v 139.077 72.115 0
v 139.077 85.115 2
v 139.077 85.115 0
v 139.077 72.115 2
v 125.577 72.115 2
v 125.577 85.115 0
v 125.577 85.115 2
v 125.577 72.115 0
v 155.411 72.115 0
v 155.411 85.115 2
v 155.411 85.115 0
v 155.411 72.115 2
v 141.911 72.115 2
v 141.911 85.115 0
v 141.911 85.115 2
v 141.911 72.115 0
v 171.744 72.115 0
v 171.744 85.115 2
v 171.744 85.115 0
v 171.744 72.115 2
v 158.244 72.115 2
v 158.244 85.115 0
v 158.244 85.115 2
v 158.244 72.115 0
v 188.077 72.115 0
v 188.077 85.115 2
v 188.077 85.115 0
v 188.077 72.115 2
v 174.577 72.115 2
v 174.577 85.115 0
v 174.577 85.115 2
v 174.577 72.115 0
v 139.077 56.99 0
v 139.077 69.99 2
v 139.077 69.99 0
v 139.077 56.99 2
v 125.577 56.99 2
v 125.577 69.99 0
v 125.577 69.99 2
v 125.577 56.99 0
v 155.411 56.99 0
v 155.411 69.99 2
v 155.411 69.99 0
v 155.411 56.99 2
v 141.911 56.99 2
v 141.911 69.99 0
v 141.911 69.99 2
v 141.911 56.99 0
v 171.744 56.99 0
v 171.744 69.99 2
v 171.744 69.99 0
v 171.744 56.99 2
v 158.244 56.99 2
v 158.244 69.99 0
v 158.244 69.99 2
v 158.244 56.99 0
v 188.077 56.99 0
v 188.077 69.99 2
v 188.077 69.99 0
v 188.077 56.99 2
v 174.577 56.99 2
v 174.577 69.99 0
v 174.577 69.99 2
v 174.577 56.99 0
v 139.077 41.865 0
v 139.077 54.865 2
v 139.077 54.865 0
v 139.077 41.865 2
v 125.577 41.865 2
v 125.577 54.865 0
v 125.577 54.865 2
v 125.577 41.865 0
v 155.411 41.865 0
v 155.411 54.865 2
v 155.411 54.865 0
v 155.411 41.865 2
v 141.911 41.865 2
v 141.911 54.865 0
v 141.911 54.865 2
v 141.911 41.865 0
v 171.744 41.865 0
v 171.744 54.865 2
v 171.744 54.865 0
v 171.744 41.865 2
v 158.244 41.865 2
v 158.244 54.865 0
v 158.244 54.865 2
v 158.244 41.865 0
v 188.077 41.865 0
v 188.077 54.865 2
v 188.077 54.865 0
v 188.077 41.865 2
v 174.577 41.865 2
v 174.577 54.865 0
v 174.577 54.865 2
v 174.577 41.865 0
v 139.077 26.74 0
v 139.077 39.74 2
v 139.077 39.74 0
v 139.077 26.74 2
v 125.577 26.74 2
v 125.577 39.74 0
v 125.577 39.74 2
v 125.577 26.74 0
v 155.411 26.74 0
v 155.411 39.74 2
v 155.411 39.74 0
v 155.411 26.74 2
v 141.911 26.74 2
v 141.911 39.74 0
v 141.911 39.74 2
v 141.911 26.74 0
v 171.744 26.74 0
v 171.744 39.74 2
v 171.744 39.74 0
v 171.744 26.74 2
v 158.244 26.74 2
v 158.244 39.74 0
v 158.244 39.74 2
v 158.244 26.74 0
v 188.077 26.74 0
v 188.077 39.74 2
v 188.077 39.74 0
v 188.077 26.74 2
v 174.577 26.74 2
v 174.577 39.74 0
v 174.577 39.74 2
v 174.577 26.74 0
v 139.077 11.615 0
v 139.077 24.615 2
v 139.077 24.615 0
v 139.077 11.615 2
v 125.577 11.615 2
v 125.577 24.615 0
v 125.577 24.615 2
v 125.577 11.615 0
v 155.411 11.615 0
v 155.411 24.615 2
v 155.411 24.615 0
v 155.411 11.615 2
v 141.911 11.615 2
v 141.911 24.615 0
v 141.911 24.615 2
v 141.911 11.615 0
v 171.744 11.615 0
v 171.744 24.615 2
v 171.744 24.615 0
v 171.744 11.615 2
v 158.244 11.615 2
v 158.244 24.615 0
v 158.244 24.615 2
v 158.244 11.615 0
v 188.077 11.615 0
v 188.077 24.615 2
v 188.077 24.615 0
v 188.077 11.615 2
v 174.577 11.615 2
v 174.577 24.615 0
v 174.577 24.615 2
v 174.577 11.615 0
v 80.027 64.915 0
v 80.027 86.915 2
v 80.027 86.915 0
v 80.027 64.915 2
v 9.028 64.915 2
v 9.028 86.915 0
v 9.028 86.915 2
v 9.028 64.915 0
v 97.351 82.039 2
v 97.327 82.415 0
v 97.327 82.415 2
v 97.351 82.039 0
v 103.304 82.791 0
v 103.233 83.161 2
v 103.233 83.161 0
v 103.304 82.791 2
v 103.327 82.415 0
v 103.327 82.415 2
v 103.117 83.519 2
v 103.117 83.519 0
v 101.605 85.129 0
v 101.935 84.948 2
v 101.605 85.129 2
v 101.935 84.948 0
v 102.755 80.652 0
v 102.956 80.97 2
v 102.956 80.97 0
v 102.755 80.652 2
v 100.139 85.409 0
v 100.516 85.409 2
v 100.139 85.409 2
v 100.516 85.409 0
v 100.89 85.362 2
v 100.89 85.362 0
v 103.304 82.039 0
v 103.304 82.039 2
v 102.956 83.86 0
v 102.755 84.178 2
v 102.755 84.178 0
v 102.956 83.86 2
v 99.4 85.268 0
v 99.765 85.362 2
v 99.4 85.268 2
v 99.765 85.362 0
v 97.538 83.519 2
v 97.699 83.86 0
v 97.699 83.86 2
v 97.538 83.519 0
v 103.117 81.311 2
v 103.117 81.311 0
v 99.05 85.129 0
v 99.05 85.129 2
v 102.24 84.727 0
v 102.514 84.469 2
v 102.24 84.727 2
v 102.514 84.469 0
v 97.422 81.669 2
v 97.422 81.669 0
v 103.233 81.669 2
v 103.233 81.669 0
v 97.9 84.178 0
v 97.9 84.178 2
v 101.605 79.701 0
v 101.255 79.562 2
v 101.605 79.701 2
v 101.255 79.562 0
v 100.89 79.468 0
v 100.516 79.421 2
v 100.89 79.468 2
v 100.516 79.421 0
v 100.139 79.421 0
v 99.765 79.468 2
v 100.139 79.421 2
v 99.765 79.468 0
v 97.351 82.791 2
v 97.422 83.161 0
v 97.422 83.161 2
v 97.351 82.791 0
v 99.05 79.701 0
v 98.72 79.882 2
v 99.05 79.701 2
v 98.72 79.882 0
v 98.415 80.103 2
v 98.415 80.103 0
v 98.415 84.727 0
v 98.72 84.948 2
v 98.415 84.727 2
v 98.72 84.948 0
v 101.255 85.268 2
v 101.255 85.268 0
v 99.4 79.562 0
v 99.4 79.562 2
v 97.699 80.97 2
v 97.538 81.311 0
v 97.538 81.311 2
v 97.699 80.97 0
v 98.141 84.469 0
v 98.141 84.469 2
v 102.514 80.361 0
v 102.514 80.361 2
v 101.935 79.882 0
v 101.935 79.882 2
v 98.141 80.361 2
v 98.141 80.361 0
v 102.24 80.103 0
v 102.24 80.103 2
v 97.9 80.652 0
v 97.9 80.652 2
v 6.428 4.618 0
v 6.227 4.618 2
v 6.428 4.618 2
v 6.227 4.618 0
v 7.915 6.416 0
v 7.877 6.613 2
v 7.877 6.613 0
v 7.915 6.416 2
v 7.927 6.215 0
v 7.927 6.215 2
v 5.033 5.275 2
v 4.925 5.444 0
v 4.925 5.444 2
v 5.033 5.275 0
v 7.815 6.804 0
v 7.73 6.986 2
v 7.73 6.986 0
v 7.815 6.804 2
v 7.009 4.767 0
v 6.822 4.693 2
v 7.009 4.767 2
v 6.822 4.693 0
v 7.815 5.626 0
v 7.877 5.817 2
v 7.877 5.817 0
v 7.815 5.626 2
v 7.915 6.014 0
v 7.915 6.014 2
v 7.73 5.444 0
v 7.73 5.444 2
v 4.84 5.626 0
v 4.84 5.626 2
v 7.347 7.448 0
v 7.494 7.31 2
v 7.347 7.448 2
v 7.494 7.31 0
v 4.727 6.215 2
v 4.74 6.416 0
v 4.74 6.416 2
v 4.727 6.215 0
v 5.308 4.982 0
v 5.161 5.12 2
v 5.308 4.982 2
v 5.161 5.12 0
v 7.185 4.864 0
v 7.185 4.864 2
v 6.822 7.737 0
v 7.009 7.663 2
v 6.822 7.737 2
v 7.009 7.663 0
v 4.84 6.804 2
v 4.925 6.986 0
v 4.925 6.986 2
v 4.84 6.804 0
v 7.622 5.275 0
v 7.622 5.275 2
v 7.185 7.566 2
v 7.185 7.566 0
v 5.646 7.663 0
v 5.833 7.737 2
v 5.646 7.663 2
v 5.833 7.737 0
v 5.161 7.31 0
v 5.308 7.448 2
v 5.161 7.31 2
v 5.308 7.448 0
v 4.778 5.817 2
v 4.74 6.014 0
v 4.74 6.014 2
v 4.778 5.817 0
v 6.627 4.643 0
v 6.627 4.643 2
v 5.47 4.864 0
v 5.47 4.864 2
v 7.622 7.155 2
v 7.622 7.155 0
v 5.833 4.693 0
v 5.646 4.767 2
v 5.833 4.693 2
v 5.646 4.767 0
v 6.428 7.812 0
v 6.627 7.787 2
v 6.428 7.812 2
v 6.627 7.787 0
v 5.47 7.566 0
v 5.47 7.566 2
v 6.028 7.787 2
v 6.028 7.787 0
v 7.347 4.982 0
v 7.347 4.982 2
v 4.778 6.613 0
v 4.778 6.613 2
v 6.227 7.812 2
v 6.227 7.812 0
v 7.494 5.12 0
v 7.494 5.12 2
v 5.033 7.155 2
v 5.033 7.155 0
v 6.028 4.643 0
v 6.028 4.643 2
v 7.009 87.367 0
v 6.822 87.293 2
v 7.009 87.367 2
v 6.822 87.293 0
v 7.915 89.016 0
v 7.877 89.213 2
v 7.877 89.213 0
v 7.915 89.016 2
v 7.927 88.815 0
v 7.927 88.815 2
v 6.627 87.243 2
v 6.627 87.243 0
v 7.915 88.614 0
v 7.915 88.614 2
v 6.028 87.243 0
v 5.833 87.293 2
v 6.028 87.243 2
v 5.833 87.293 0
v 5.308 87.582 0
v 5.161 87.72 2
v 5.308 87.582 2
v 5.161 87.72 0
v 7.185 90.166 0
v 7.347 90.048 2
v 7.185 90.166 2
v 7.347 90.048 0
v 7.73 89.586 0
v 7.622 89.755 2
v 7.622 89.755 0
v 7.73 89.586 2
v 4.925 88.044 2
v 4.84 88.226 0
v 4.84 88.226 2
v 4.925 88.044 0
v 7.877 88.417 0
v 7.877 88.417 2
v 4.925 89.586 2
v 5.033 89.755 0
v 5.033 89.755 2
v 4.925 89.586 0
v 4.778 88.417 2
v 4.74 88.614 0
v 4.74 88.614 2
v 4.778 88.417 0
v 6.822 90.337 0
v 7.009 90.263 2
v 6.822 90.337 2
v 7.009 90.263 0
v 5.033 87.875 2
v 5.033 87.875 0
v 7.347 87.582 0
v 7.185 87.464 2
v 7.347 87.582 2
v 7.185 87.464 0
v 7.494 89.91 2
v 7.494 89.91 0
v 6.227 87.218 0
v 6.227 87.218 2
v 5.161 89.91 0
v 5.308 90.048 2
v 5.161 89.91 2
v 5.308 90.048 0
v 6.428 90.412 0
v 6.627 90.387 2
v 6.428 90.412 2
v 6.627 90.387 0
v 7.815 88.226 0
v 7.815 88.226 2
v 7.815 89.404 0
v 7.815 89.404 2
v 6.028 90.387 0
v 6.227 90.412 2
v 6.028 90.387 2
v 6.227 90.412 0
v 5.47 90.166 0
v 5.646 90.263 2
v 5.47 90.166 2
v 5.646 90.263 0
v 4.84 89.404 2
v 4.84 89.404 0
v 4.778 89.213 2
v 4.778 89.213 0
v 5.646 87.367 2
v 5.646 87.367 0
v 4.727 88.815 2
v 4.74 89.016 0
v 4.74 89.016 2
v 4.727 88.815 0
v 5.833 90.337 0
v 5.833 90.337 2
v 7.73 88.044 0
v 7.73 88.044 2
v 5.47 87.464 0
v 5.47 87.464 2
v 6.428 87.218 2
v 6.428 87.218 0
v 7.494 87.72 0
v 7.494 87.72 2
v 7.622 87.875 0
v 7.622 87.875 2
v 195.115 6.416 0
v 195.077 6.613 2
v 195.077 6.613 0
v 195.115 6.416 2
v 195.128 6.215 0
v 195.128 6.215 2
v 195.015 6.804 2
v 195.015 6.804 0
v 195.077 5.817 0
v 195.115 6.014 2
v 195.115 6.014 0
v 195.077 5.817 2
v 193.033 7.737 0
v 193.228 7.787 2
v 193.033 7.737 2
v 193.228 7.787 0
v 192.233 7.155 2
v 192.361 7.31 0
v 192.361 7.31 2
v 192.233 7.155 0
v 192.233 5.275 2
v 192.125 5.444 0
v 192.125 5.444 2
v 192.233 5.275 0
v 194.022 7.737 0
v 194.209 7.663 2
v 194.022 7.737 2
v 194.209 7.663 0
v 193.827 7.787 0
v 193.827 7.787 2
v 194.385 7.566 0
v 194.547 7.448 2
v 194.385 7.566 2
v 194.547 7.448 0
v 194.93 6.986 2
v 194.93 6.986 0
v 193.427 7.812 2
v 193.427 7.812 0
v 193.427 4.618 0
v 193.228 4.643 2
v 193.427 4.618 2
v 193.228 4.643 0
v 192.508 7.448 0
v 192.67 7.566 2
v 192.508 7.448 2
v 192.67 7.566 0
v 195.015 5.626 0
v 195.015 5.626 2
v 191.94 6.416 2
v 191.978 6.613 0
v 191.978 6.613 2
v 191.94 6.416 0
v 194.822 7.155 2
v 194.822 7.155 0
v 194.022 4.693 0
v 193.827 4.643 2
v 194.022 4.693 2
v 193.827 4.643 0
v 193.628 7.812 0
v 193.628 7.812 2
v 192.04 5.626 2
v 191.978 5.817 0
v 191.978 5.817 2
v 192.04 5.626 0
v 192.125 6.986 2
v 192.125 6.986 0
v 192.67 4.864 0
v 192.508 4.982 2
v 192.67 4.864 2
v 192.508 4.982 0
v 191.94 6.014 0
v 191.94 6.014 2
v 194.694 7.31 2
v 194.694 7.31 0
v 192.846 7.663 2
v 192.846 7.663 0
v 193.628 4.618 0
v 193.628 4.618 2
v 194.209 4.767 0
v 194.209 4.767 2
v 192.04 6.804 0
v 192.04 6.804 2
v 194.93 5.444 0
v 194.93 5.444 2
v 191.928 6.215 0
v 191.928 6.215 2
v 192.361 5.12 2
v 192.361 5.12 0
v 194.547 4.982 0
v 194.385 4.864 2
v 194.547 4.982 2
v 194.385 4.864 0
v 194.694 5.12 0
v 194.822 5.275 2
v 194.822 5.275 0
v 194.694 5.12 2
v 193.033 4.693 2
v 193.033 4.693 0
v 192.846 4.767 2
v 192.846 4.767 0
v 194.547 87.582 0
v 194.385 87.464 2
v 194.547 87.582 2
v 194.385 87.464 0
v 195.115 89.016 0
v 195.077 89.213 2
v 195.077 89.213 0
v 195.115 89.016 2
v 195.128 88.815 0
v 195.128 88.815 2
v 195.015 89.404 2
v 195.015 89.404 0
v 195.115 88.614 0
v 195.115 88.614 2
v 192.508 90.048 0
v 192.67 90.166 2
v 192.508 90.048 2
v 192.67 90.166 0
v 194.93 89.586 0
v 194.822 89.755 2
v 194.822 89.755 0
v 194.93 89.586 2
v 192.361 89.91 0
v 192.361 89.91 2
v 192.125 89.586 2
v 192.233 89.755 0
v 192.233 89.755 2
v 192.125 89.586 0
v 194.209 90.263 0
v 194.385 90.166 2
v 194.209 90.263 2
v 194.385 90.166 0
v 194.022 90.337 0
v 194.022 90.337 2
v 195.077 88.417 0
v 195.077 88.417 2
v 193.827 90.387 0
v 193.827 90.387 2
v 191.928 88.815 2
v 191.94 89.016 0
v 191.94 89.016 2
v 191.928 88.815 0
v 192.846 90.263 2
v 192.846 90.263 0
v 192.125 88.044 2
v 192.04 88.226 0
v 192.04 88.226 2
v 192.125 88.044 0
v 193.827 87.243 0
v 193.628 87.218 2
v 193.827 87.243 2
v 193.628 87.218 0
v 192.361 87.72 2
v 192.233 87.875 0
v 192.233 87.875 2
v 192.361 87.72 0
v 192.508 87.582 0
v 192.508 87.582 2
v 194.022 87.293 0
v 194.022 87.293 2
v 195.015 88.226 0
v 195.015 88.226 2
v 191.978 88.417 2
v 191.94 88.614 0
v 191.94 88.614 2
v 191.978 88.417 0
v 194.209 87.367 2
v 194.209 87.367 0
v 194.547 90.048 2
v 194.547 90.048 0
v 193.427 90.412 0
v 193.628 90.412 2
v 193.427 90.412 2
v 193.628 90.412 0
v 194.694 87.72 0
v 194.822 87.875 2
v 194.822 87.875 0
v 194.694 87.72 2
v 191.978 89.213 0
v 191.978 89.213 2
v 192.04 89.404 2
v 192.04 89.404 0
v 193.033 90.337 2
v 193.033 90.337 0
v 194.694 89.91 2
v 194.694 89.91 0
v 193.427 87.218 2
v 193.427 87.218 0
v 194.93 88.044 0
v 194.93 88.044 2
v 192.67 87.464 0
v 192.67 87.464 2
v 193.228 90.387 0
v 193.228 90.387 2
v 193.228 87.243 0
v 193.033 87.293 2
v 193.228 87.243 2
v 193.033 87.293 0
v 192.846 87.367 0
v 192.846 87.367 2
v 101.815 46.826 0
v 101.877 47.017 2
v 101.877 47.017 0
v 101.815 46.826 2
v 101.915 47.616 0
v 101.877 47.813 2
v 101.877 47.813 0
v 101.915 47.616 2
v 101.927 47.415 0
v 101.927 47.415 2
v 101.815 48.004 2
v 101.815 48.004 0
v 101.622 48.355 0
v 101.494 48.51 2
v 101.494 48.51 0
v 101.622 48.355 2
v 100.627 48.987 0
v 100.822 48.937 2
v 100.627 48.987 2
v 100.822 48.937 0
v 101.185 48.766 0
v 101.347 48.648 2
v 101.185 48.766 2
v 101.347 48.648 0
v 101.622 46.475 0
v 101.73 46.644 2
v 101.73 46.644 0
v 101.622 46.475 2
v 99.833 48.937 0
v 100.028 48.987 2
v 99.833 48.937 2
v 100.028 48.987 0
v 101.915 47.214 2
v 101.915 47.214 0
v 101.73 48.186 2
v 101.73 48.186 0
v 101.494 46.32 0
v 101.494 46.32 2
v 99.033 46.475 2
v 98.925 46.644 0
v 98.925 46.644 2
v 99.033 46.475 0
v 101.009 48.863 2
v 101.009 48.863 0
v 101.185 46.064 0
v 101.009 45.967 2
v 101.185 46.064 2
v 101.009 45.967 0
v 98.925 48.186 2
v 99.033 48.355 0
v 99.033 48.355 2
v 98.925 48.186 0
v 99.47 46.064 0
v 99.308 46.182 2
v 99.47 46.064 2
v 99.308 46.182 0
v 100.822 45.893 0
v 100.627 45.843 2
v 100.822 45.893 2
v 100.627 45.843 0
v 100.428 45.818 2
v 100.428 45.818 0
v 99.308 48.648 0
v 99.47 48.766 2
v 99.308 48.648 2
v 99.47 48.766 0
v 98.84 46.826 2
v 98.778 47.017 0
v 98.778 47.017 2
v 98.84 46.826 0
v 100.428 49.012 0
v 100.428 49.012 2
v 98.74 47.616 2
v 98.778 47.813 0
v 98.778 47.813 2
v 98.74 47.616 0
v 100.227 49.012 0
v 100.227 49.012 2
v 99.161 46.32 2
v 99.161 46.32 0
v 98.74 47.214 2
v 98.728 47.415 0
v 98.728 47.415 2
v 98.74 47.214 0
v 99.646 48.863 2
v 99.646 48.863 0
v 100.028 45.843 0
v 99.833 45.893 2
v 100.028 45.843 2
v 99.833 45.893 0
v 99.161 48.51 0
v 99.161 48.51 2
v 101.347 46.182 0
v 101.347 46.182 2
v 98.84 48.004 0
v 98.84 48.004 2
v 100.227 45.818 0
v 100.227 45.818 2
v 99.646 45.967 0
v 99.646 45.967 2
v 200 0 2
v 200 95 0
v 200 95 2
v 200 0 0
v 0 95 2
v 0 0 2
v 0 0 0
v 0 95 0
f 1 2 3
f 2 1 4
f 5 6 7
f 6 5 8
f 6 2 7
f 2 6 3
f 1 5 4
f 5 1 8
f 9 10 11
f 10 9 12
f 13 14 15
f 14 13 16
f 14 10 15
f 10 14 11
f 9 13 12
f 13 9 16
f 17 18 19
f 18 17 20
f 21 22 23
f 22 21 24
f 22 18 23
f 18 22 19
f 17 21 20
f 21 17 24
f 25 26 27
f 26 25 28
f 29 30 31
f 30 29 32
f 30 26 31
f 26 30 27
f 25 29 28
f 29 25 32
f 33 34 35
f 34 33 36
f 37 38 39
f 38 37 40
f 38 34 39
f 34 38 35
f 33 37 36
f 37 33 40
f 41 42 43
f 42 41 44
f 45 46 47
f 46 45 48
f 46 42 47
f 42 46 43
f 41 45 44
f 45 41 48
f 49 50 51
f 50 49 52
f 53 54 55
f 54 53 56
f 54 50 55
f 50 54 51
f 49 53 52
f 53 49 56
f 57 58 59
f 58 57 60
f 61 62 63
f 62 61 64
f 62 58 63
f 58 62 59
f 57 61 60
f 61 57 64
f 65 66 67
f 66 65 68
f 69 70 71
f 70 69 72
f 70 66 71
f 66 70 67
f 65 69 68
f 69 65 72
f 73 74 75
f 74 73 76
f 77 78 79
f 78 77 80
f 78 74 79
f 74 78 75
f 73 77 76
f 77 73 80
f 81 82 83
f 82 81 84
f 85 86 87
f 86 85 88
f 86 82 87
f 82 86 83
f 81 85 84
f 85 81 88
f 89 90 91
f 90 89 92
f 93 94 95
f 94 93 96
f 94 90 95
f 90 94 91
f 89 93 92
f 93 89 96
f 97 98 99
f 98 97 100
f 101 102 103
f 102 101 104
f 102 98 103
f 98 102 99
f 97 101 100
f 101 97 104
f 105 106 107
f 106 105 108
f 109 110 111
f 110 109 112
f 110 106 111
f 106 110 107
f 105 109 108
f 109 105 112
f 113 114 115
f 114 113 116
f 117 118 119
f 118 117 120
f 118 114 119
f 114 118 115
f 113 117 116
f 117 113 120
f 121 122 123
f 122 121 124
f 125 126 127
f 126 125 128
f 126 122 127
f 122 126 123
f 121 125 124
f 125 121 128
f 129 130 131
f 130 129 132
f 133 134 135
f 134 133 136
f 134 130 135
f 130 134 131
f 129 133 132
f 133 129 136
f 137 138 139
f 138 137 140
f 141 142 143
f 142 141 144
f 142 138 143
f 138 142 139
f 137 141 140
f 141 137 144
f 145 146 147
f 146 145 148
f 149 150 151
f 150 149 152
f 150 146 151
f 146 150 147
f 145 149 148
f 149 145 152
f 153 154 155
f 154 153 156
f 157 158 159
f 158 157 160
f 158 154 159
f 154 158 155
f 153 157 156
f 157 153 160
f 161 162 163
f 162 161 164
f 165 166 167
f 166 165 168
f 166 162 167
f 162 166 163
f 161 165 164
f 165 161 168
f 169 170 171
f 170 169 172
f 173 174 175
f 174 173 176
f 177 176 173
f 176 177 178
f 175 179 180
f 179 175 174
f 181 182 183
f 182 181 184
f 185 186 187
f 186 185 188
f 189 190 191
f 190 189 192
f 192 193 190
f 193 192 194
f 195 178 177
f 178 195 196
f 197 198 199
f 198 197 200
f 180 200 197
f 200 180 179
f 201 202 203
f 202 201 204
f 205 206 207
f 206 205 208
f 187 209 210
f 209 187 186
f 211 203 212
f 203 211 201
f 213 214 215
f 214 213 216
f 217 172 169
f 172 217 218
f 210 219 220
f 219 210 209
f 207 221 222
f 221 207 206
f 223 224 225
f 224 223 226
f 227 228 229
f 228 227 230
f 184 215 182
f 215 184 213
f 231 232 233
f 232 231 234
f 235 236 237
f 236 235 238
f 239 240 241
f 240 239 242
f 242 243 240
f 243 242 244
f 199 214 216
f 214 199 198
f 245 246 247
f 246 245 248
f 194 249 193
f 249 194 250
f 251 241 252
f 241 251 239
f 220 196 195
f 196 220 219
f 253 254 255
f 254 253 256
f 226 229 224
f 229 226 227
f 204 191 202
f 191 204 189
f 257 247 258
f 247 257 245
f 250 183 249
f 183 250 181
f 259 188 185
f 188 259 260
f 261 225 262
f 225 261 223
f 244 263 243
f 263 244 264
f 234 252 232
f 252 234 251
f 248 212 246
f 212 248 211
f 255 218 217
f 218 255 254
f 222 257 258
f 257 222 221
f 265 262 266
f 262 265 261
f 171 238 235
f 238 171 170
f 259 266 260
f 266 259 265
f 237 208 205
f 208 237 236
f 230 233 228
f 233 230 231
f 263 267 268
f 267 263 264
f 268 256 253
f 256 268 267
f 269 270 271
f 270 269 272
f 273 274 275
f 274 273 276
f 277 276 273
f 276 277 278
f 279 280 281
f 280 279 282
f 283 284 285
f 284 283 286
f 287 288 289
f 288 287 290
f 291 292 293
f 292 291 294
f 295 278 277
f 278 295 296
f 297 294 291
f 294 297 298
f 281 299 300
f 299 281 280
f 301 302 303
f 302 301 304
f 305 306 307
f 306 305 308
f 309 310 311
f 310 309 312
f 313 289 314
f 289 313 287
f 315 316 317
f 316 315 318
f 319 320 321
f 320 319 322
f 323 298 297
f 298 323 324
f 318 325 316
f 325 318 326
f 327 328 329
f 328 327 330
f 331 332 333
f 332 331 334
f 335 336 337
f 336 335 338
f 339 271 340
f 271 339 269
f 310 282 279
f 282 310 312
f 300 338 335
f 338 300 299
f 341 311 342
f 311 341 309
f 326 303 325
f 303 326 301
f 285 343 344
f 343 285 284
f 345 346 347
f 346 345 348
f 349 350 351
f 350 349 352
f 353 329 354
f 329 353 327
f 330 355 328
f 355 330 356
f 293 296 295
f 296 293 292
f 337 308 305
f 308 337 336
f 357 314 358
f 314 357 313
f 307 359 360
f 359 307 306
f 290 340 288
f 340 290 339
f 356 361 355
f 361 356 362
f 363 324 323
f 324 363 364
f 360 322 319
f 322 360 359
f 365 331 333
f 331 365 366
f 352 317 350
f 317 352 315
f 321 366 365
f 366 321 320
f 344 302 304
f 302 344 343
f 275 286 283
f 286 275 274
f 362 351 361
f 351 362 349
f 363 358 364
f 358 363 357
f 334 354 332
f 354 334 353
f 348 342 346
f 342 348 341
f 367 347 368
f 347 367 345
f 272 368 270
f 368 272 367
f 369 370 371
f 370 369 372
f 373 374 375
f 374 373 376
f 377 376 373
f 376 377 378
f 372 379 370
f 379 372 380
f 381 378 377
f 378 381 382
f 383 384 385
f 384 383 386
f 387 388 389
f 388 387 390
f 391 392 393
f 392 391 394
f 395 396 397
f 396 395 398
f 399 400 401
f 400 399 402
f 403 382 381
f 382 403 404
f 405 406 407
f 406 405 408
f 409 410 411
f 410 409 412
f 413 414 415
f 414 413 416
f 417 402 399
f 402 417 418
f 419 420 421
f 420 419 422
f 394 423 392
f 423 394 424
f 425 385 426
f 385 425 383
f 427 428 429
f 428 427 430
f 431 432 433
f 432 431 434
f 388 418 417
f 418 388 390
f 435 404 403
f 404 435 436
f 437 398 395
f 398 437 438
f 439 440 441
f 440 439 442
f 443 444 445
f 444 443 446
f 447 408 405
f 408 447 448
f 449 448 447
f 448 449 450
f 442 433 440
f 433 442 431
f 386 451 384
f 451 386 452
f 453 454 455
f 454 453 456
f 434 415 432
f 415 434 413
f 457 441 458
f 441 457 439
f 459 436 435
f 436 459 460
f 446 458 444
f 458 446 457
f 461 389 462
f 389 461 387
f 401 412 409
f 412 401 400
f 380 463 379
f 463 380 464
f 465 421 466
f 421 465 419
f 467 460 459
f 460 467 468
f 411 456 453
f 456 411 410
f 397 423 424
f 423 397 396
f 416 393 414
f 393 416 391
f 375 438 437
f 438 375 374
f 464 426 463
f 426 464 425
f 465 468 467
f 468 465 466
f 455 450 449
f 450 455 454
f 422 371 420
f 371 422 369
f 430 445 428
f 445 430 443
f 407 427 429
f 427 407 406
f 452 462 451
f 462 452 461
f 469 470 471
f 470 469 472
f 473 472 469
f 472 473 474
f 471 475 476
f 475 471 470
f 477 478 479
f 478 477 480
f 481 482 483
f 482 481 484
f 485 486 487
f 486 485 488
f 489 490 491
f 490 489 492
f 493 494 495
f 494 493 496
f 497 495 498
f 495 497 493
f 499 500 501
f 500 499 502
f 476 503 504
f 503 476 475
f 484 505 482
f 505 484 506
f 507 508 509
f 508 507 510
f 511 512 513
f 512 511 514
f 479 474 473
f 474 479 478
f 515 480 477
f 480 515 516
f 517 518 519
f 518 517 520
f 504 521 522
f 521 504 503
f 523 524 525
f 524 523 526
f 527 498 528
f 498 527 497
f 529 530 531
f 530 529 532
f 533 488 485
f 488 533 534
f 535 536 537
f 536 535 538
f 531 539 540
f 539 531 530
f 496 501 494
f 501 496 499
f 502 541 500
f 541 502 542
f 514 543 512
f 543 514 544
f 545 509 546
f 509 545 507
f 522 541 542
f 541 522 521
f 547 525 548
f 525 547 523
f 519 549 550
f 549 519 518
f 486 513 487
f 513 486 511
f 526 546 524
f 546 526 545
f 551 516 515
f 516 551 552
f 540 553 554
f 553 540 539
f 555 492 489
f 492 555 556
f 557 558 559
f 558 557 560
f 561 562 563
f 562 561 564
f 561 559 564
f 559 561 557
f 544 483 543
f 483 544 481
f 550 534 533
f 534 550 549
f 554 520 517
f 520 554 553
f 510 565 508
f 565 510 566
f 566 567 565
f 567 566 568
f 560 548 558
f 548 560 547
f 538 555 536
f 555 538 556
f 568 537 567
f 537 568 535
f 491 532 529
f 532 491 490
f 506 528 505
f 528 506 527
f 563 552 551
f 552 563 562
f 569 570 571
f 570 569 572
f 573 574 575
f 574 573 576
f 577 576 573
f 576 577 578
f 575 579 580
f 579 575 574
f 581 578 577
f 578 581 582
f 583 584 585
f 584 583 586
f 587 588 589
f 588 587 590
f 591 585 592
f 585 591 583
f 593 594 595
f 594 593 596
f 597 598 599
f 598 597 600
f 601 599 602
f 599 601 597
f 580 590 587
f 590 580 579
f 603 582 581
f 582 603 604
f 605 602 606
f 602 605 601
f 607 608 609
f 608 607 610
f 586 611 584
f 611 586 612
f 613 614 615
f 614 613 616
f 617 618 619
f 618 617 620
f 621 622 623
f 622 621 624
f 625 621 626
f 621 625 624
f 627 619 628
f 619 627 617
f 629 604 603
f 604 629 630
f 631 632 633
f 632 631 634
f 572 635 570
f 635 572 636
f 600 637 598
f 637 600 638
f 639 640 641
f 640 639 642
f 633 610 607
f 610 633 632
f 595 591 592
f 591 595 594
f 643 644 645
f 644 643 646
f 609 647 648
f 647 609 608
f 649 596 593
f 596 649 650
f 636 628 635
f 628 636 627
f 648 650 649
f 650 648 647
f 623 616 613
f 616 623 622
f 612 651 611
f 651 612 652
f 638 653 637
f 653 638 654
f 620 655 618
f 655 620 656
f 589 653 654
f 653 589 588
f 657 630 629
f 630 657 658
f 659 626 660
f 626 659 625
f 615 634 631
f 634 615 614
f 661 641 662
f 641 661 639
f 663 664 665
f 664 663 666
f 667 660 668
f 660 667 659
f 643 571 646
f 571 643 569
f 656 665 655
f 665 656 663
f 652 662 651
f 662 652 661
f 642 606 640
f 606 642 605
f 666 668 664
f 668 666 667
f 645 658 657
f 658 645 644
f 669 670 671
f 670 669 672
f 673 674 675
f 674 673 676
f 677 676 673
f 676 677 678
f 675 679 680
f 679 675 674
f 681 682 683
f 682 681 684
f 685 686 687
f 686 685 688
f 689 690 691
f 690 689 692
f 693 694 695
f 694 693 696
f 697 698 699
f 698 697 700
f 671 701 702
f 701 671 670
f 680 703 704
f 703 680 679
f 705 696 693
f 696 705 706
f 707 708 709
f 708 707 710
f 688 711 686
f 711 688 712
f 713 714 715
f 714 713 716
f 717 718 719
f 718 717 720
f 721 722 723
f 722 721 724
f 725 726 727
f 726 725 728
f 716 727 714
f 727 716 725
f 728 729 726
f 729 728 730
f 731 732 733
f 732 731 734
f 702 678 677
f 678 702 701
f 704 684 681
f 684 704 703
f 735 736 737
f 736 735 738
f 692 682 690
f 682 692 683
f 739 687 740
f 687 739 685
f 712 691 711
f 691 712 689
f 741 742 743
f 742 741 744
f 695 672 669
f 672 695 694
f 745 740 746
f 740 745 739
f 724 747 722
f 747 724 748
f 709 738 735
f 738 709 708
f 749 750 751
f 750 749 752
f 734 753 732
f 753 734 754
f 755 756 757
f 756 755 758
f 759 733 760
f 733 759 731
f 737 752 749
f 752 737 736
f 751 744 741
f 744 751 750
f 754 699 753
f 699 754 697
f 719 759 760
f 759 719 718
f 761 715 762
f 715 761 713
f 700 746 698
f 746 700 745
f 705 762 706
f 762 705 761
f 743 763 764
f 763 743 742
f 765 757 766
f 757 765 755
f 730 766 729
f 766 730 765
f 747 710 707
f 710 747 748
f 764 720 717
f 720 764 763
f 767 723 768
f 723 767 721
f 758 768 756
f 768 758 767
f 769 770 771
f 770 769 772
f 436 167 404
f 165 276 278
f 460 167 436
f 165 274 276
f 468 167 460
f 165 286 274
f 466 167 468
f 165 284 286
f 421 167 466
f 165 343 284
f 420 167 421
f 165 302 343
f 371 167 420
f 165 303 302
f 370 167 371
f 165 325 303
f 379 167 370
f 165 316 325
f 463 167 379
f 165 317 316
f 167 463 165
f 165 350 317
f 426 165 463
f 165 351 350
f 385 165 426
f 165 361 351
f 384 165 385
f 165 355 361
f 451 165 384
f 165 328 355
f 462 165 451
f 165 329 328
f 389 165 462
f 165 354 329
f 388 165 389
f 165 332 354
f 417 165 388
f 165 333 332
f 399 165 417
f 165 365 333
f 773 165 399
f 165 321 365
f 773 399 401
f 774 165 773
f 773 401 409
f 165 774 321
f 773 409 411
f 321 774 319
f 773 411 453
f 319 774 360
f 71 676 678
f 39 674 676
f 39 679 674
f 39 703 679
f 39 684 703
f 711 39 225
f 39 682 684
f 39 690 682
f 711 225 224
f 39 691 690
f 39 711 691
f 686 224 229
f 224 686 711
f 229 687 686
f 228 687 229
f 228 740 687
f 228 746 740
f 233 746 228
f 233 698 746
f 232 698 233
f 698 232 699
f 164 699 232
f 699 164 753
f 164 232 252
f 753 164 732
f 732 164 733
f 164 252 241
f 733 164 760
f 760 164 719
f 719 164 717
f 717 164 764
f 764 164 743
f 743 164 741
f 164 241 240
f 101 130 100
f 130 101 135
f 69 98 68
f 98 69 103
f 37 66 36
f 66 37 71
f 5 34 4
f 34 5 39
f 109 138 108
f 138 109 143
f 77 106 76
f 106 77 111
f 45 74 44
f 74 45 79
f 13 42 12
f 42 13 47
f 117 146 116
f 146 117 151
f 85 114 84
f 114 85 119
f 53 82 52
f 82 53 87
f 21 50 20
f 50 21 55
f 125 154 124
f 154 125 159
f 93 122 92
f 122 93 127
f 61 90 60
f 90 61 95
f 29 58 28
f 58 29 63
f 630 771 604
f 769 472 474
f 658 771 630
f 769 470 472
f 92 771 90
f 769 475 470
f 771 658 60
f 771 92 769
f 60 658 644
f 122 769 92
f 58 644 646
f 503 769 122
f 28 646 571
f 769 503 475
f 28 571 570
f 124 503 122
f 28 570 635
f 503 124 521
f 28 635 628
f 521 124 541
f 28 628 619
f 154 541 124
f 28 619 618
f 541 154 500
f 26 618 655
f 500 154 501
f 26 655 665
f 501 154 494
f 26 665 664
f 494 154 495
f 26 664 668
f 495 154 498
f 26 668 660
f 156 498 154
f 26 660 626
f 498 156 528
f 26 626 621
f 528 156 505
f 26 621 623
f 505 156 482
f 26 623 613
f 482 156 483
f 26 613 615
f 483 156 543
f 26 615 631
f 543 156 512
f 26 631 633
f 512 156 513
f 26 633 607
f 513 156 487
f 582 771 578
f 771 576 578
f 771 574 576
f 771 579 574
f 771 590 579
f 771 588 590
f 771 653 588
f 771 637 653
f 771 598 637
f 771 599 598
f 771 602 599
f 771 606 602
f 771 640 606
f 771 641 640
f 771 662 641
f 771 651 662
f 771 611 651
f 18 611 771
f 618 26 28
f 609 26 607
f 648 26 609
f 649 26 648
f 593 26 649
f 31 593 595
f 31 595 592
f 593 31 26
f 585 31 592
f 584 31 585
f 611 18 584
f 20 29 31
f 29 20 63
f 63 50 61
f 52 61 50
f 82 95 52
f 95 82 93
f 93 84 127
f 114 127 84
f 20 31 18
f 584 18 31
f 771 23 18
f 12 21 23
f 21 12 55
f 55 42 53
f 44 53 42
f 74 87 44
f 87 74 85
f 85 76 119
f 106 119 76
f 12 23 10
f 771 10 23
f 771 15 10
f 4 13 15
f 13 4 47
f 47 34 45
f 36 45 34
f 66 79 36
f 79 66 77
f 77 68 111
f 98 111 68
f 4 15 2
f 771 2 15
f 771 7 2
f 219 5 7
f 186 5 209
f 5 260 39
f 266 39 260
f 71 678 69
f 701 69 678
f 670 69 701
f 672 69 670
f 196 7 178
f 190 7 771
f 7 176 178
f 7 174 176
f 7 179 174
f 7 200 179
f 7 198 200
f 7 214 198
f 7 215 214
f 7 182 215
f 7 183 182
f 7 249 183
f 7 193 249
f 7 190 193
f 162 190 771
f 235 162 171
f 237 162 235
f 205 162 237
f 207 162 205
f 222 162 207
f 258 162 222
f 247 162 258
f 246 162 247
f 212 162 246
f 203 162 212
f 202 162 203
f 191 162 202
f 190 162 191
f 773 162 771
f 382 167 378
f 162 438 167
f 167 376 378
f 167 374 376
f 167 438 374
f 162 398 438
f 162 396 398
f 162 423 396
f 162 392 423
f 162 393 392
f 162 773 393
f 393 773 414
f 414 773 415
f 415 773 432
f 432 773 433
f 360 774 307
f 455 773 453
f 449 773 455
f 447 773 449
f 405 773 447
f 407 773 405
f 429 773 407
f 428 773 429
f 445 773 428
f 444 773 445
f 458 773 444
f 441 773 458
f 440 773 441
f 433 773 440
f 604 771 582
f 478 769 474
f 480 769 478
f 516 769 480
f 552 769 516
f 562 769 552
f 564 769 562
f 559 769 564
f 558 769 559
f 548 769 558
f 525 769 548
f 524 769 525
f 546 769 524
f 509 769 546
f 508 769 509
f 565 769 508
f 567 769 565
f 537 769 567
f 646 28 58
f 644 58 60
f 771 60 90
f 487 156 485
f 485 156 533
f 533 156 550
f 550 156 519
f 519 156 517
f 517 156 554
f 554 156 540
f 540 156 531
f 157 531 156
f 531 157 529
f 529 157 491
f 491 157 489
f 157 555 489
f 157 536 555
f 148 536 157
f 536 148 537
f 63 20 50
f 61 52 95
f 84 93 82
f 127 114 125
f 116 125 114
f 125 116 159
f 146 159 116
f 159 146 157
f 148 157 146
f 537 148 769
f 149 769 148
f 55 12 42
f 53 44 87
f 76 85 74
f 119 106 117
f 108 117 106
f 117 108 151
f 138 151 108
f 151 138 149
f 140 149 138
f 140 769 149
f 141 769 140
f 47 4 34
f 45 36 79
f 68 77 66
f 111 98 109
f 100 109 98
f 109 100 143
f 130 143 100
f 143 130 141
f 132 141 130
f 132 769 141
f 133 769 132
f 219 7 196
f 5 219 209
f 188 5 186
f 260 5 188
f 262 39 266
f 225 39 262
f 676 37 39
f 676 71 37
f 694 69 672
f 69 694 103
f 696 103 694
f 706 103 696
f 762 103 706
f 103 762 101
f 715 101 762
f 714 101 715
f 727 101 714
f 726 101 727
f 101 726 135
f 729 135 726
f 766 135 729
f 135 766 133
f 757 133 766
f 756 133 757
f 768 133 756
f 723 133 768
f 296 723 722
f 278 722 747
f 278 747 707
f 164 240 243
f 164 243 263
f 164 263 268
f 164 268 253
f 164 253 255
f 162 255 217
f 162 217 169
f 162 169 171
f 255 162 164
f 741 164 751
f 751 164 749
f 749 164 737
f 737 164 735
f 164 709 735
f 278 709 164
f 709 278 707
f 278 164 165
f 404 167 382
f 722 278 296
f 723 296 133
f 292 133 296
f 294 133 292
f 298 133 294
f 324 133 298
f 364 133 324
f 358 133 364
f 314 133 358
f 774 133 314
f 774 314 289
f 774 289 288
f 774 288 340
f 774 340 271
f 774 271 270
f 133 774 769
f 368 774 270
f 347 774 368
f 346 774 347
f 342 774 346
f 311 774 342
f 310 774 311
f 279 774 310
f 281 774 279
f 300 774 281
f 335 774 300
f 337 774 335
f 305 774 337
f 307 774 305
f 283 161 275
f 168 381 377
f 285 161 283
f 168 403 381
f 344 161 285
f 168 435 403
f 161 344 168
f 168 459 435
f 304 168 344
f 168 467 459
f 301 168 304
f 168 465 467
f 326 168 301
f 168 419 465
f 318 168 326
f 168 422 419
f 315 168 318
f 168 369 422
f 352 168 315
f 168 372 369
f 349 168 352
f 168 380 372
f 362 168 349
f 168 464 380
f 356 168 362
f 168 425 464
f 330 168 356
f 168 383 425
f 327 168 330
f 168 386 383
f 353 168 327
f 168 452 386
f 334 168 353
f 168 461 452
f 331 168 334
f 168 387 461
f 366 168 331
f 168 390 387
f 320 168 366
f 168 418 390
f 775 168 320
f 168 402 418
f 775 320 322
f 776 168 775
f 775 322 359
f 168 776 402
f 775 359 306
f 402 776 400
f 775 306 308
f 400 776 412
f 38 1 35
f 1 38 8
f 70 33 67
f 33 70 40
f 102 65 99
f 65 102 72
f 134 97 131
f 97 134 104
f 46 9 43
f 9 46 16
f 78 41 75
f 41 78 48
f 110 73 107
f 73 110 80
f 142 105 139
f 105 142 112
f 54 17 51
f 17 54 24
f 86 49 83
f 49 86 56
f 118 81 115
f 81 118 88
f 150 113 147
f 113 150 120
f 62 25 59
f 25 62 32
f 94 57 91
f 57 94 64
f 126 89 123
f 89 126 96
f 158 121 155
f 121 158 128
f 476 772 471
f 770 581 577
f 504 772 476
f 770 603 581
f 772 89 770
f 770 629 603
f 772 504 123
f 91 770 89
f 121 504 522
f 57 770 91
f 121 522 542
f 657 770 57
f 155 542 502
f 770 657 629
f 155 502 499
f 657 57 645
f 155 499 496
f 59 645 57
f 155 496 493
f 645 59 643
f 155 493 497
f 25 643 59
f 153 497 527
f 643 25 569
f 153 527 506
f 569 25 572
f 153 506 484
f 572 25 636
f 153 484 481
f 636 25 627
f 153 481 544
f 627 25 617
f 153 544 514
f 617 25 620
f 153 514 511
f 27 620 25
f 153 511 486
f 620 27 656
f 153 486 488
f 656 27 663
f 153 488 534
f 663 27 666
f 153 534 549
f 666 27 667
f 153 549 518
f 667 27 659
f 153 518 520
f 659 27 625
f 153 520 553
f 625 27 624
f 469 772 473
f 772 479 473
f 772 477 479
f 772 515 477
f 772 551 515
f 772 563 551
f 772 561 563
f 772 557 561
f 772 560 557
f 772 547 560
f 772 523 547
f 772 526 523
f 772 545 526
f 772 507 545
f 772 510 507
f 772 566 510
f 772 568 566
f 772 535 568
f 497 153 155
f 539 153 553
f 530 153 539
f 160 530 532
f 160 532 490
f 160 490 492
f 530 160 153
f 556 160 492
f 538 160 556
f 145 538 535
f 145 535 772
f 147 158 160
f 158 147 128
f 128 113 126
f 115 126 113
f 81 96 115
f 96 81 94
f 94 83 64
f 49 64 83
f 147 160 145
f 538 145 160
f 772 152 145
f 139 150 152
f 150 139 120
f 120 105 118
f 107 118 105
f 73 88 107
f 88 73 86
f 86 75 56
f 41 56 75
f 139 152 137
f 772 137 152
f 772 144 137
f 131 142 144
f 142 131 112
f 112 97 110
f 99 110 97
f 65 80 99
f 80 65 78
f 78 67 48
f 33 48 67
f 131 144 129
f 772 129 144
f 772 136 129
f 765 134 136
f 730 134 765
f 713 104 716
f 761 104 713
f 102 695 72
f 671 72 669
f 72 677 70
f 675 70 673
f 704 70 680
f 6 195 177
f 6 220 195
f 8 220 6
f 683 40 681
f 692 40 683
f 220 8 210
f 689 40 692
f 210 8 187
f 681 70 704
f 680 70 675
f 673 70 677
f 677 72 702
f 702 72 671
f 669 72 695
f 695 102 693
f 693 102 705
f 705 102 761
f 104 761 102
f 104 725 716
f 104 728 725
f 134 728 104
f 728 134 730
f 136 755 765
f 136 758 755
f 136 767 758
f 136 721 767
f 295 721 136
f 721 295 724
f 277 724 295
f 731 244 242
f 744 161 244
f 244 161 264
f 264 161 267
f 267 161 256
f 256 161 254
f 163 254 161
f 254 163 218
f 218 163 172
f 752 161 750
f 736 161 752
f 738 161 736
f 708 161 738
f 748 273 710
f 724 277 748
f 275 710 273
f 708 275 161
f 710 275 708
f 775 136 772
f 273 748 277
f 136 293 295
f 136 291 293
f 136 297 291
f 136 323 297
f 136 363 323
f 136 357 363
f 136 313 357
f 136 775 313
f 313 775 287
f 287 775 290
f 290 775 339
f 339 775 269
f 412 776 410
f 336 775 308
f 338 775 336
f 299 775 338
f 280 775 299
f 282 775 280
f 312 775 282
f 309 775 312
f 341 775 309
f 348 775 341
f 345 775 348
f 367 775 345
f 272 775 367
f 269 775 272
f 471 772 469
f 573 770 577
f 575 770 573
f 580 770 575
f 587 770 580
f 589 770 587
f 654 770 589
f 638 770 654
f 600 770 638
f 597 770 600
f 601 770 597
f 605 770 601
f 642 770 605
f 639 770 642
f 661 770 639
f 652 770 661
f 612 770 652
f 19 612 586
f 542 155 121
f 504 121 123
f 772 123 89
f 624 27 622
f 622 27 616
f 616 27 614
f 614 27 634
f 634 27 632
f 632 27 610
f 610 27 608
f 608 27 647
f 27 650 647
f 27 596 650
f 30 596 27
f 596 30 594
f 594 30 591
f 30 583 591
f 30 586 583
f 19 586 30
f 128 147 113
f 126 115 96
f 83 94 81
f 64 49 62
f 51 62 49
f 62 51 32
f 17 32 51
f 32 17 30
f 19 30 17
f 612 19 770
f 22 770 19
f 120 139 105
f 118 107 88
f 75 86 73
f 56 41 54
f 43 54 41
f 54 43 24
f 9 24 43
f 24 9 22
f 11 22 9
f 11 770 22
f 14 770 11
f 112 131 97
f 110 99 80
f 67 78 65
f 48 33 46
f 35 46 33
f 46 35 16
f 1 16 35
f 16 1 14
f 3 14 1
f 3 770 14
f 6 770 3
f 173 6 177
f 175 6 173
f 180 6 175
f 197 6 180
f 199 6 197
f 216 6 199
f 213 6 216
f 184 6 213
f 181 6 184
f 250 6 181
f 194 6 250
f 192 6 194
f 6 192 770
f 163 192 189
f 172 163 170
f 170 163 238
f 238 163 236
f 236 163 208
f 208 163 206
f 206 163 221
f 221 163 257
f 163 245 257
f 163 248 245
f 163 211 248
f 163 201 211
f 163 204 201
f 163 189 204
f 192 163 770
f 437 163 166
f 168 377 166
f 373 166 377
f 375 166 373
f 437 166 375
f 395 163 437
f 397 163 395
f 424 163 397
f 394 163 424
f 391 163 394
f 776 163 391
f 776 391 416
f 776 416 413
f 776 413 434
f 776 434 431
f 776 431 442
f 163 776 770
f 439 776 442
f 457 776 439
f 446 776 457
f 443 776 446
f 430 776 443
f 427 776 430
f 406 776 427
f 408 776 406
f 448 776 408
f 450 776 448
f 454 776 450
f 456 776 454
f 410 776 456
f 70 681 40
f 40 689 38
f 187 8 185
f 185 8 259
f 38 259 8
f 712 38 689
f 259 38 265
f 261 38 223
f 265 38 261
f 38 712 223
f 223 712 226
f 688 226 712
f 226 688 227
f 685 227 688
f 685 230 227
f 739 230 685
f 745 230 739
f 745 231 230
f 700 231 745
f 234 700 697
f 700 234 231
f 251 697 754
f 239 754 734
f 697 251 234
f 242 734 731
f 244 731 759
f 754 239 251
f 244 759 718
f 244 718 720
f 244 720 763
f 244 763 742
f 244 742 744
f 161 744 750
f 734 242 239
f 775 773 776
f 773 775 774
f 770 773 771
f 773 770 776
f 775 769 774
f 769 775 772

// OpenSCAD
// Configurable parameters.
front_plate_width = 200;
front_plate_height = 95;
front_plate_depth = 2;

// Size of the PCB.
pcb_width = 194.945;
pcb_height = 90.170;

// Derived variables.
offset_x = (front_plate_width - pcb_width) / 2;
offset_y = (front_plate_height - pcb_height) / 2;

// Set the fidelity of round holes.
$fn = 50;

// Show the PCB.
//module PCB()
//{
//    color("green") {
//        translate([offset_x, pcb_height + offset_y, -5]) {
//            import("Generic_Front_Panel_PCB.stl");
//        }
//    }
//}
//PCB();

// Create the front plate.
module FrontPlate() {
    cube([front_plate_width, front_plate_height, front_plate_depth]);
}

// Cylinder to cut out the hole for the power LED.
module LedHole() {
    cylinder(h = front_plate_depth * 4, r = 3, center = true);
}

// Prism to cut out the hole for the LED segment displays.
module SegmentsHole() {
    translate([6.5, 62.5, 0]) {
        cube([71, 22, front_plate_depth * 2]);
    }
}

// Prism to cut out a hole for a push button.
module PushButton() {
    cube([13.5, 13.0, front_plate_depth * 4], center=true);
}

// Cut a row of four push button holes.
hole_sep_x = 49.0 / 3;
hole_sep_y = 60.5 / 4;
module PushButtonRow() {
    PushButton();
    translate([hole_sep_x, 0, 0]) {
        PushButton();
    }
    translate([hole_sep_x * 2, 0, 0]) {
        PushButton();
    }
    translate([hole_sep_x * 3, 0, 0]) {
        PushButton();
    }
}

// Cut five rows of push button holes.
module PushButtonGrid() {
    PushButtonRow();
    translate([0, -hole_sep_y, 0]) {
        PushButtonRow();
    }
    translate([0, -hole_sep_y * 2, 0]) {
        PushButtonRow();
    }
    translate([0, -hole_sep_y * 3, 0]) {
        PushButtonRow();
    }
    translate([0, -hole_sep_y * 4, 0]) {
        PushButtonRow();
    }
}

// Cut a hole for a mounting screw.
module MountingHole() {
    cylinder(h = front_plate_depth * 4, r = 1.6, center = true);
}

// Build the entire front plate with holes cut.
difference() {
    FrontPlate();
    translate([offset_x, offset_y, -front_plate_depth/2]) {
        SegmentsHole();
        translate([97.8, 80, -front_plate_depth / 3]) {
            LedHole();
        }
        translate([129.8, 76.2, 0]) {
            PushButtonGrid();
        }
        translate([3.8, 3.8, 0]) {
            MountingHole();
        }
        translate([3.8, 86.4, 0]) {
            MountingHole();
        }
        translate([191, 3.8, 0]) {
            MountingHole();
        }
        translate([191, 86.4, 0]) {
            MountingHole();
        }
        translate([97.8, 45, 0]) {
            MountingHole();
        }
    }
}
